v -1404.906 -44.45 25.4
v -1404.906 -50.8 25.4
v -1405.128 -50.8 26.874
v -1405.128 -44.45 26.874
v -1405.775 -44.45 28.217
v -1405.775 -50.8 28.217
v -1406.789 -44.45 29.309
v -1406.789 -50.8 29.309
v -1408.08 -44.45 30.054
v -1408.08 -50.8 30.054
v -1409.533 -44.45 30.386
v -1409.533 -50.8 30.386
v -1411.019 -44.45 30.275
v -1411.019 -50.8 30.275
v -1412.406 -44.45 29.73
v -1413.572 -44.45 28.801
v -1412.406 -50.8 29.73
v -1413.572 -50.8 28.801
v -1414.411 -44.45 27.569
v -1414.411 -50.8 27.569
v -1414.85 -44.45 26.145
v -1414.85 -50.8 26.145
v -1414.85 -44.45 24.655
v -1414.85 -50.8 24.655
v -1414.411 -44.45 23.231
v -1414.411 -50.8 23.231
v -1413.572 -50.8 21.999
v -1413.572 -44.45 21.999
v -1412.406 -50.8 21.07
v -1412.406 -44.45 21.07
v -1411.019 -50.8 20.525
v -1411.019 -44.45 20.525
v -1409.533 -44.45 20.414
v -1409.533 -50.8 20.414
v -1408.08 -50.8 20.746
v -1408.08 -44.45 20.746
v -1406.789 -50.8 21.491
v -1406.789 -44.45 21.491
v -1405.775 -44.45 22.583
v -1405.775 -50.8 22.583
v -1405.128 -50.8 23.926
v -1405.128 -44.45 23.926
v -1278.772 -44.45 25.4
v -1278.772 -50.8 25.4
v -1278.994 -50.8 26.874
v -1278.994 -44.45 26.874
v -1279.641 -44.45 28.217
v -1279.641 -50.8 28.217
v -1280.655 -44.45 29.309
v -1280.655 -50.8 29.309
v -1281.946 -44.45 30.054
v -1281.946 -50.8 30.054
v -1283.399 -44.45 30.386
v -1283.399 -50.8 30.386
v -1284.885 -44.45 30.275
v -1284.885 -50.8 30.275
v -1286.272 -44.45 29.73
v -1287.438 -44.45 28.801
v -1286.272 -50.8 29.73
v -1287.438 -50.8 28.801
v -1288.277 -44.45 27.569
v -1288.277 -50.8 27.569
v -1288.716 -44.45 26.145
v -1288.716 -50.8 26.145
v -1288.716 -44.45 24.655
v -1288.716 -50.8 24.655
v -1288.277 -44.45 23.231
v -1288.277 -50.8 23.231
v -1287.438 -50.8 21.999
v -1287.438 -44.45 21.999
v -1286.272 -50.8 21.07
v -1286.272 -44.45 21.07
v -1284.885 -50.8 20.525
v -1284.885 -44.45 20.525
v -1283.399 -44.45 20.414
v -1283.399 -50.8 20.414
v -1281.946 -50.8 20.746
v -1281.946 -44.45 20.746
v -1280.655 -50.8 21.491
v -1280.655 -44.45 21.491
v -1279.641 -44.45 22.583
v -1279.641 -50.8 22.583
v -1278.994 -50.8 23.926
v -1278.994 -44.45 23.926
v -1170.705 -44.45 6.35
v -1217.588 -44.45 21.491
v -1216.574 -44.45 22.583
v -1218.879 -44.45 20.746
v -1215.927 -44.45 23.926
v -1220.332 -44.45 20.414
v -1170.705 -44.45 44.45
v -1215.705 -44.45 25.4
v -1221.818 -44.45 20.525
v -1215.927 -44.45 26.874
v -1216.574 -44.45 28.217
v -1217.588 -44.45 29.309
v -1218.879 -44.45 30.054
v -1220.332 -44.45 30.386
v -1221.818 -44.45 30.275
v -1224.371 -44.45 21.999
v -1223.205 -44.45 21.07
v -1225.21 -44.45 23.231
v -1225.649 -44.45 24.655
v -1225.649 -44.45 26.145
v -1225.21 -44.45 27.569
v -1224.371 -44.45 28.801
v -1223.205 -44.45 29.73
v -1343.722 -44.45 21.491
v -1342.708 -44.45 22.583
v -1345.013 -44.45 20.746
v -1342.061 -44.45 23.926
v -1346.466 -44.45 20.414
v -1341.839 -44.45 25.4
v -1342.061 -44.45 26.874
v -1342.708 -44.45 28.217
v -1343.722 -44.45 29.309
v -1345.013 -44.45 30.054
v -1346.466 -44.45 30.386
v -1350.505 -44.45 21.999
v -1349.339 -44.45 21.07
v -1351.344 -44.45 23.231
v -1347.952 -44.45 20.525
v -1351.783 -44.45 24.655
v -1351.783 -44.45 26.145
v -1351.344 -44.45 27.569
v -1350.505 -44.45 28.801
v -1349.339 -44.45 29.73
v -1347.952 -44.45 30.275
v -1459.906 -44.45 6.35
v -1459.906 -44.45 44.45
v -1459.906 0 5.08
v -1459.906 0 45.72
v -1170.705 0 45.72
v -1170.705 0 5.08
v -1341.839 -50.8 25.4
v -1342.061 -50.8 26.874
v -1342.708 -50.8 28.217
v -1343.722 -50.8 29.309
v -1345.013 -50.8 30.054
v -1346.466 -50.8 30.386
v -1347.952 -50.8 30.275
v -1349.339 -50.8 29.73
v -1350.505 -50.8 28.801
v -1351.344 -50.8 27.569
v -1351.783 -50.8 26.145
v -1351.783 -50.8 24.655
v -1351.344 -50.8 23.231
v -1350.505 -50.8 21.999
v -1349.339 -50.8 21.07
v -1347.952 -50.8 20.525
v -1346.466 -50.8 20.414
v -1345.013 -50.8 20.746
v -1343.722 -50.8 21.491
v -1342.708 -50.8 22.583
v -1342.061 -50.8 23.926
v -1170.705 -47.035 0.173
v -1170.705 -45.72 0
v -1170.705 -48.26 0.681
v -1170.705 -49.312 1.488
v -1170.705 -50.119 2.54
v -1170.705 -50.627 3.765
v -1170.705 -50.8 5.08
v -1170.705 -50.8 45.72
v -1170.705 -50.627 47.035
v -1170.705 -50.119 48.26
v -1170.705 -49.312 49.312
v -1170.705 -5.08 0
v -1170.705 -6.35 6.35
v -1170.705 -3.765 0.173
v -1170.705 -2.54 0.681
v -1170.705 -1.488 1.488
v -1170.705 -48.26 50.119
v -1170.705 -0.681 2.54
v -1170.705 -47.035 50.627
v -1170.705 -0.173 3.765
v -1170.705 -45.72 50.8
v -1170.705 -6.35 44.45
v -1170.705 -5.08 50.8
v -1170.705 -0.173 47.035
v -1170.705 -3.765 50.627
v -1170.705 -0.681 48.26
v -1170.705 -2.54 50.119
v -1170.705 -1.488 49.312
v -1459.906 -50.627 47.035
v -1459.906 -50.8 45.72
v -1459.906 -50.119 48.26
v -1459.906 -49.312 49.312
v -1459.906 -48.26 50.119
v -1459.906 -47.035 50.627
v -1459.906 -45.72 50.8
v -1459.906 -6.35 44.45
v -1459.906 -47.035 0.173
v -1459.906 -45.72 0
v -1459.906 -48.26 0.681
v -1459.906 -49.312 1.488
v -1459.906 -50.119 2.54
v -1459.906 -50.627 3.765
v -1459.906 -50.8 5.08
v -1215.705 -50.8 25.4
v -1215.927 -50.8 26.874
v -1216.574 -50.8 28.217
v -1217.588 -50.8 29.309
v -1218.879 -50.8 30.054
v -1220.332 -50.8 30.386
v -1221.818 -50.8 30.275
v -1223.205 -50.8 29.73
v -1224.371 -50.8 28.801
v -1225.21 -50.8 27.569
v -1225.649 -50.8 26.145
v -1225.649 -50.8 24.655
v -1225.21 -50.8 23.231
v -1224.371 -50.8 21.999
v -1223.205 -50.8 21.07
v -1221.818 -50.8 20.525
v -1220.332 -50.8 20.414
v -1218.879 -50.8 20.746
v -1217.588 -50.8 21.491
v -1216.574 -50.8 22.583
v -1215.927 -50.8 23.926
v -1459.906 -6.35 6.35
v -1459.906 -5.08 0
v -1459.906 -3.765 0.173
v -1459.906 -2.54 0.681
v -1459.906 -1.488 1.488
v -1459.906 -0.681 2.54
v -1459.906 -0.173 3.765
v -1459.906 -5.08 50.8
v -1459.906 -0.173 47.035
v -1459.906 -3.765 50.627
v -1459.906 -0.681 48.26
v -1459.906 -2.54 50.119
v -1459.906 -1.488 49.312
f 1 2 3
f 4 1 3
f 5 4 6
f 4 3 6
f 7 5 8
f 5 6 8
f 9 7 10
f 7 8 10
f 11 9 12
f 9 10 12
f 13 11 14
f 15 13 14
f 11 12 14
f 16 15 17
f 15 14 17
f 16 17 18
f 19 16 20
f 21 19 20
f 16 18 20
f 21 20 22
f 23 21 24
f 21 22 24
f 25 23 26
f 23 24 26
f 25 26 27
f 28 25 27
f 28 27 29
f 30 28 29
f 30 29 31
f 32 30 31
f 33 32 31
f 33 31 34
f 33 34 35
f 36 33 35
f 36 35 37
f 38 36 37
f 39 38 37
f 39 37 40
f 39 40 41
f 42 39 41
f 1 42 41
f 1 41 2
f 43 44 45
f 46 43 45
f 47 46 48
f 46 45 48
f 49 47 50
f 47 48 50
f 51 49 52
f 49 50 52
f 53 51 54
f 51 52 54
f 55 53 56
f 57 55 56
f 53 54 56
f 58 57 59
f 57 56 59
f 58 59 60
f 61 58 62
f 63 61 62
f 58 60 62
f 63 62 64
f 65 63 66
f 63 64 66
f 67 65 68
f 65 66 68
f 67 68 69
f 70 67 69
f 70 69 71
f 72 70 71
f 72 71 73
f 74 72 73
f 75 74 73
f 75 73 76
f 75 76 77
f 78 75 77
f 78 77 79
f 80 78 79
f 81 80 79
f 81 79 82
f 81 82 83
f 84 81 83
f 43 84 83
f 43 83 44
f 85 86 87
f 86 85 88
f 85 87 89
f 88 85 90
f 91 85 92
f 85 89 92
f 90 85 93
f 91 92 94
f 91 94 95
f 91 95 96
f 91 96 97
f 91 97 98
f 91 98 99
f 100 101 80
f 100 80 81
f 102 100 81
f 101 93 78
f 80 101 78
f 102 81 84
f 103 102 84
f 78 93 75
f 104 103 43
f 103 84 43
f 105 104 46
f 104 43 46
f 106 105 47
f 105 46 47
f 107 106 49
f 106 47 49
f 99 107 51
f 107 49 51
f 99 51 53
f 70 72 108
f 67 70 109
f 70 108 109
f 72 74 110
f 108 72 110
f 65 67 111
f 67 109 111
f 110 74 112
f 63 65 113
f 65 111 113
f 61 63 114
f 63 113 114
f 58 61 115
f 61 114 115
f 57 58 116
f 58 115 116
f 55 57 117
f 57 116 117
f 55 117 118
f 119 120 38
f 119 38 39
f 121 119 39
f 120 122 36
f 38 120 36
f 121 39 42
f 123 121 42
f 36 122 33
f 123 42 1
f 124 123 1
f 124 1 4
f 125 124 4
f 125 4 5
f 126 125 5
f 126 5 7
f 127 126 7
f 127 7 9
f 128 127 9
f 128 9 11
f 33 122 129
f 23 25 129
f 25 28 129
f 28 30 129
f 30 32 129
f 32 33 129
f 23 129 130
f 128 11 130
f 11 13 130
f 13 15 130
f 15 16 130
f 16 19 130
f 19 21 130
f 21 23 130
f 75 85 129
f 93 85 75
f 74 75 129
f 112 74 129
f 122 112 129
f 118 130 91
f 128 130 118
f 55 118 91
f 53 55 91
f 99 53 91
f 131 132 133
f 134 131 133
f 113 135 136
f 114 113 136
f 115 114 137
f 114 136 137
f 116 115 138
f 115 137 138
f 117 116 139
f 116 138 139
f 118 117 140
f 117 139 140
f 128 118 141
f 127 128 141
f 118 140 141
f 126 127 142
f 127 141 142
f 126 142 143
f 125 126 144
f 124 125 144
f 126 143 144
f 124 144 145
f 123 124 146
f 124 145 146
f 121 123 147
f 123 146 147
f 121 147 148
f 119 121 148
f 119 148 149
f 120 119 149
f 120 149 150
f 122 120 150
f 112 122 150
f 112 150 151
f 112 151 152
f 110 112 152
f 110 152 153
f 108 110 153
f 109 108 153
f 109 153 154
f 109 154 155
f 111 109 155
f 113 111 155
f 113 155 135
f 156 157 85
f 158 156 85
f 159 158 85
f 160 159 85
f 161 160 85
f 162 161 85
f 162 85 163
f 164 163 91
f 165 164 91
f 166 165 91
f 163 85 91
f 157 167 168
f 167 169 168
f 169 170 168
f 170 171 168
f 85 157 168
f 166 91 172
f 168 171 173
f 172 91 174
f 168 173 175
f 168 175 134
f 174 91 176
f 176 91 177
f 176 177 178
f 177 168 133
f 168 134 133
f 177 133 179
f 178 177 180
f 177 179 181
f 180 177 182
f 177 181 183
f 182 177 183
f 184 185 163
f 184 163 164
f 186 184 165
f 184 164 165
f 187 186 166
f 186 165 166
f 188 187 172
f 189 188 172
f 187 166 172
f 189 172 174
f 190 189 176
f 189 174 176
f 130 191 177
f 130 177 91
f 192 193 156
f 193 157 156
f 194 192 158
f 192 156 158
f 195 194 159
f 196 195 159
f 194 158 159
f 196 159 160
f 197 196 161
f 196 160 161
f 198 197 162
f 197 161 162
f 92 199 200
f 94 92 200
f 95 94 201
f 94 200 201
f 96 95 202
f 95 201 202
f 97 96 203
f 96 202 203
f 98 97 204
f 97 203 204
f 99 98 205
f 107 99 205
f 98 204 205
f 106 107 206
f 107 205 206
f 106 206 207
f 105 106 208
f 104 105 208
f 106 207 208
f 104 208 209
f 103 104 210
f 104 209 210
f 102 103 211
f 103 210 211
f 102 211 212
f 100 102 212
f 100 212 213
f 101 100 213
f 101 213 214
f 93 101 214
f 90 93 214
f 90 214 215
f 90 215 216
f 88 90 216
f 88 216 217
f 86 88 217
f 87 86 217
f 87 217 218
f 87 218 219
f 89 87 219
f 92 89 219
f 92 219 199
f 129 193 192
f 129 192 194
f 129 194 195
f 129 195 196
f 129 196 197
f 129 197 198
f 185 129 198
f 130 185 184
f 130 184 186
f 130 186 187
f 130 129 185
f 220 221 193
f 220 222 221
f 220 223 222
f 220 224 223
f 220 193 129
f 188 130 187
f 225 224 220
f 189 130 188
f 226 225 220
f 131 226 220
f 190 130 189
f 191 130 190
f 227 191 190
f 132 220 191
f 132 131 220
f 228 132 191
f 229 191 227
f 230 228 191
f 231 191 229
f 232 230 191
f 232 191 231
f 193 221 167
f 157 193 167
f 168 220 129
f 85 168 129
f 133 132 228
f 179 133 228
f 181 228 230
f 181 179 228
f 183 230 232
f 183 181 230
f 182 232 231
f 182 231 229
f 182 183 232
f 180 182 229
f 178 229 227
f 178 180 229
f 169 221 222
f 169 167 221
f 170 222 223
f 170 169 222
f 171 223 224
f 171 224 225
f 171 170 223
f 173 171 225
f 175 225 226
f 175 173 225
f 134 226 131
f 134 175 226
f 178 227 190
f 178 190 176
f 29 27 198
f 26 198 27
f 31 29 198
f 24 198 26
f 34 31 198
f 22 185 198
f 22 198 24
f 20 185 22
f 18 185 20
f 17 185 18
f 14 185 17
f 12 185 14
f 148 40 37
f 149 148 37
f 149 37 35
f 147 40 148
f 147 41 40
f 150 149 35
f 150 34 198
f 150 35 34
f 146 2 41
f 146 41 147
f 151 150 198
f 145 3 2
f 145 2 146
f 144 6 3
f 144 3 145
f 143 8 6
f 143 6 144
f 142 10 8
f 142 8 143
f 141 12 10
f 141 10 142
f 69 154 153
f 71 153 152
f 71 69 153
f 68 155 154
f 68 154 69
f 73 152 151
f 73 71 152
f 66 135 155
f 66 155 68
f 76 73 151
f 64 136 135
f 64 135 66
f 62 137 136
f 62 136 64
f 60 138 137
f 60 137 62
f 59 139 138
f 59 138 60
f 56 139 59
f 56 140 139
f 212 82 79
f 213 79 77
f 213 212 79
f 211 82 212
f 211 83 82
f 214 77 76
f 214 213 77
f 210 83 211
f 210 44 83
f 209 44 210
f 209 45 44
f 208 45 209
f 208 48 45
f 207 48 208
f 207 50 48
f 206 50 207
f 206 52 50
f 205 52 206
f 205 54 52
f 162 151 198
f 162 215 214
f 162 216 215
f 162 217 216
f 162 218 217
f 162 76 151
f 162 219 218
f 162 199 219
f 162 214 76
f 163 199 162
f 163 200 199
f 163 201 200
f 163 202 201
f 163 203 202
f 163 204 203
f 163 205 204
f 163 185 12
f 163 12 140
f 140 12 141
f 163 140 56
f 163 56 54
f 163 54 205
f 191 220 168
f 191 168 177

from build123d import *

# Parameters (mm, degrees)
F0_W     = 289.201
F0_H     = 50.8
F1_DEPTH = 50.8
F2_R     = 5
F3_DEPTH = 25.4
F4_W     = 38.1
F4_H     = 38.1
F5_DEPTH = 289.202
F6_R     = 5.08


with BuildPart() as f1:
    # F0 (on Front) → F1 (new body)
    with BuildSketch(Plane.XZ):
        with Locations((-1315.305821, 25.4)):
            Rectangle(F0_W, F0_H)
    extrude(amount=F1_DEPTH)

    # F2 (on face) → F3 (cut)
    with BuildSketch(Plane.XZ.offset(50.8)):
        with Locations((-1346.839321, 25.4)):
            Circle(F2_R)
        with Locations((-1220.705321, 25.4)):
            Circle(F2_R)
        with Locations((-1283.772321, 25.4)):
            Circle(F2_R)
        with Locations((-1409.906321, 25.4)):
            Circle(F2_R)
    extrude(amount=-F3_DEPTH, mode=Mode.SUBTRACT)

    # F4 (on face) → F5 (cut, through all)
    with BuildSketch(Plane(origin=(-1459.906321, 0, 0), x_dir=(0, -1, 0), z_dir=(-1, 0, 0))):
        with Locations((25.4, 25.4)):
            Rectangle(F4_W, F4_H)
    extrude(amount=-F5_DEPTH, mode=Mode.SUBTRACT)

    # F6
    f6_edges = [f1.edges().sort_by_distance(p)[0] for p in [
        (-1315.305821, -50.8, 50.8),
        (-1315.305821, 0, 50.8),
        (-1315.305821, -50.8, 0),
        (-1315.305821, 0, 0),
    ]]
    fillet(f6_edges, radius=F6_R)


solid = f1.part
